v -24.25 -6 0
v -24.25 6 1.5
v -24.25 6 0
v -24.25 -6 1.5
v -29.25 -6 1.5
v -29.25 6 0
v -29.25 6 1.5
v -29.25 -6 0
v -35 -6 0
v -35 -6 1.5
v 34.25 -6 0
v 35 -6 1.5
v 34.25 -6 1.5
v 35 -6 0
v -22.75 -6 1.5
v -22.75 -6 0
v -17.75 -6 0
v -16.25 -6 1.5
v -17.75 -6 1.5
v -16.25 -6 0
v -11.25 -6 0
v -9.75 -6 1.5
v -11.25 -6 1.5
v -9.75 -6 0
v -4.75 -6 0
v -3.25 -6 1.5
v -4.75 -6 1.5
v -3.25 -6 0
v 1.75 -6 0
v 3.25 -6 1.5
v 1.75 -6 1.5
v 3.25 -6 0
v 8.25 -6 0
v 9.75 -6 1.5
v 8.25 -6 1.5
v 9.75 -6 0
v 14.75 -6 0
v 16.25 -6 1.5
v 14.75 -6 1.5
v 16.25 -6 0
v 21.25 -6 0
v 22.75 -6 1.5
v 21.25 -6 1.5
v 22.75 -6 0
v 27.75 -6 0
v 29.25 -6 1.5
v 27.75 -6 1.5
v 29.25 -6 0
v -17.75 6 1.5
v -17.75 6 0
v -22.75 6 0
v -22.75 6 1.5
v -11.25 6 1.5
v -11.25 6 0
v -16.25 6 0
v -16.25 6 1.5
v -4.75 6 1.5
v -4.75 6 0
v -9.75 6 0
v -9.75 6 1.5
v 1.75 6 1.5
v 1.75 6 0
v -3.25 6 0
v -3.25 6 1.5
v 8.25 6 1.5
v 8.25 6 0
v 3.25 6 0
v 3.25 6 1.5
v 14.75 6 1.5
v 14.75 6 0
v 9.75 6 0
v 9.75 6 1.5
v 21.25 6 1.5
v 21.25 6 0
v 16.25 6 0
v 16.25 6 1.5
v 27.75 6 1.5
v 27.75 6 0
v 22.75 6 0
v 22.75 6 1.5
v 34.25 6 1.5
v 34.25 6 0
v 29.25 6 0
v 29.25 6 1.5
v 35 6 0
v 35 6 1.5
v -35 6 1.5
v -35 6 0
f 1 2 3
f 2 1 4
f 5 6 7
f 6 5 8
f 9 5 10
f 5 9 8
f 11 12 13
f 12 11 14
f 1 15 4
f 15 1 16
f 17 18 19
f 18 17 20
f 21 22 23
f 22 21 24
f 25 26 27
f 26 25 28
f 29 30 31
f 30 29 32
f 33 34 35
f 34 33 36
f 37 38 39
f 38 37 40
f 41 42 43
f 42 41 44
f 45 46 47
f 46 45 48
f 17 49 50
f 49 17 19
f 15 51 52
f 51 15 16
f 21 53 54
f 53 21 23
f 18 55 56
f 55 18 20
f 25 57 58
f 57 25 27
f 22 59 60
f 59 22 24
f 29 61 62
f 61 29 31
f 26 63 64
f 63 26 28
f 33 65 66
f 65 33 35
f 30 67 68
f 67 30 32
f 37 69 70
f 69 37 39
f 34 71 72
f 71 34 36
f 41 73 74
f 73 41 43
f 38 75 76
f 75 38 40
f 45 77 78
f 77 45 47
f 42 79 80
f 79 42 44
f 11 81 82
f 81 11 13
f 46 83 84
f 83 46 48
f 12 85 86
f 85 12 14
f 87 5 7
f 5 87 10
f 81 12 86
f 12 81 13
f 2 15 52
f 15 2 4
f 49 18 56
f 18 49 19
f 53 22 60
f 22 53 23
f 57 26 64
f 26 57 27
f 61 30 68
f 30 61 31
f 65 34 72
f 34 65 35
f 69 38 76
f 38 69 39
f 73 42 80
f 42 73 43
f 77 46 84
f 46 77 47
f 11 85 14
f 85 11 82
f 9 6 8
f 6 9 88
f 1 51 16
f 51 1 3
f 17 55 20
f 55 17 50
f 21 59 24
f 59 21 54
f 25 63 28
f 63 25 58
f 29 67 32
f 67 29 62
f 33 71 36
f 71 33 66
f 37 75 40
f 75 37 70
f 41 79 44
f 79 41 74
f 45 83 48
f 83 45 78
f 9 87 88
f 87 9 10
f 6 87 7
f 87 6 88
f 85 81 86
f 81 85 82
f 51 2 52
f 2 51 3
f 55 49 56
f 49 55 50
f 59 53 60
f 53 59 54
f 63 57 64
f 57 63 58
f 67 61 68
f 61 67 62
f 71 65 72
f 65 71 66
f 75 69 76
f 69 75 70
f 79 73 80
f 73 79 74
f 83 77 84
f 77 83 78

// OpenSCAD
// 10-well comb for agarose gel casting, printed lying flat
// Units: mm

// ---------- Parameters ----------
plate_t      = 1.5;    // plate thickness (Z)
spine_len    = 70;     // spine length (X)
spine_w      = 12;     // spine width (Y)
tooth_count  = 10;     // number of teeth
tooth_w      = 5.0;    // tooth width (X)
tooth_len    = 12;     // tooth length (Y)
gap          = 1.5;    // gap between teeth (X)
eps          = 0.5;    // cutter overshoot past faces

$fn = 64;

// ---------- Derived ----------
pitch   = tooth_w + gap;              // centre-to-centre tooth spacing
x_start = -(tooth_count - 1) * pitch / 2; // first tooth centre (row centred on spine)

// ---------- Model ----------
difference() {
    // Base plate
    translate([-spine_len / 2, -spine_w / 2, 0])
        cube([spine_len, spine_w, plate_t]);

    // Teeth hanging in -Y from the spine's +Y edge
    for (i = [0 : tooth_count - 1]) {
        translate([x_start + i * pitch,
                   spine_w / 2 - tooth_len,
                   -eps])
            cube([tooth_w, tooth_len + eps, plate_t + 2 * eps]);
    }
}
